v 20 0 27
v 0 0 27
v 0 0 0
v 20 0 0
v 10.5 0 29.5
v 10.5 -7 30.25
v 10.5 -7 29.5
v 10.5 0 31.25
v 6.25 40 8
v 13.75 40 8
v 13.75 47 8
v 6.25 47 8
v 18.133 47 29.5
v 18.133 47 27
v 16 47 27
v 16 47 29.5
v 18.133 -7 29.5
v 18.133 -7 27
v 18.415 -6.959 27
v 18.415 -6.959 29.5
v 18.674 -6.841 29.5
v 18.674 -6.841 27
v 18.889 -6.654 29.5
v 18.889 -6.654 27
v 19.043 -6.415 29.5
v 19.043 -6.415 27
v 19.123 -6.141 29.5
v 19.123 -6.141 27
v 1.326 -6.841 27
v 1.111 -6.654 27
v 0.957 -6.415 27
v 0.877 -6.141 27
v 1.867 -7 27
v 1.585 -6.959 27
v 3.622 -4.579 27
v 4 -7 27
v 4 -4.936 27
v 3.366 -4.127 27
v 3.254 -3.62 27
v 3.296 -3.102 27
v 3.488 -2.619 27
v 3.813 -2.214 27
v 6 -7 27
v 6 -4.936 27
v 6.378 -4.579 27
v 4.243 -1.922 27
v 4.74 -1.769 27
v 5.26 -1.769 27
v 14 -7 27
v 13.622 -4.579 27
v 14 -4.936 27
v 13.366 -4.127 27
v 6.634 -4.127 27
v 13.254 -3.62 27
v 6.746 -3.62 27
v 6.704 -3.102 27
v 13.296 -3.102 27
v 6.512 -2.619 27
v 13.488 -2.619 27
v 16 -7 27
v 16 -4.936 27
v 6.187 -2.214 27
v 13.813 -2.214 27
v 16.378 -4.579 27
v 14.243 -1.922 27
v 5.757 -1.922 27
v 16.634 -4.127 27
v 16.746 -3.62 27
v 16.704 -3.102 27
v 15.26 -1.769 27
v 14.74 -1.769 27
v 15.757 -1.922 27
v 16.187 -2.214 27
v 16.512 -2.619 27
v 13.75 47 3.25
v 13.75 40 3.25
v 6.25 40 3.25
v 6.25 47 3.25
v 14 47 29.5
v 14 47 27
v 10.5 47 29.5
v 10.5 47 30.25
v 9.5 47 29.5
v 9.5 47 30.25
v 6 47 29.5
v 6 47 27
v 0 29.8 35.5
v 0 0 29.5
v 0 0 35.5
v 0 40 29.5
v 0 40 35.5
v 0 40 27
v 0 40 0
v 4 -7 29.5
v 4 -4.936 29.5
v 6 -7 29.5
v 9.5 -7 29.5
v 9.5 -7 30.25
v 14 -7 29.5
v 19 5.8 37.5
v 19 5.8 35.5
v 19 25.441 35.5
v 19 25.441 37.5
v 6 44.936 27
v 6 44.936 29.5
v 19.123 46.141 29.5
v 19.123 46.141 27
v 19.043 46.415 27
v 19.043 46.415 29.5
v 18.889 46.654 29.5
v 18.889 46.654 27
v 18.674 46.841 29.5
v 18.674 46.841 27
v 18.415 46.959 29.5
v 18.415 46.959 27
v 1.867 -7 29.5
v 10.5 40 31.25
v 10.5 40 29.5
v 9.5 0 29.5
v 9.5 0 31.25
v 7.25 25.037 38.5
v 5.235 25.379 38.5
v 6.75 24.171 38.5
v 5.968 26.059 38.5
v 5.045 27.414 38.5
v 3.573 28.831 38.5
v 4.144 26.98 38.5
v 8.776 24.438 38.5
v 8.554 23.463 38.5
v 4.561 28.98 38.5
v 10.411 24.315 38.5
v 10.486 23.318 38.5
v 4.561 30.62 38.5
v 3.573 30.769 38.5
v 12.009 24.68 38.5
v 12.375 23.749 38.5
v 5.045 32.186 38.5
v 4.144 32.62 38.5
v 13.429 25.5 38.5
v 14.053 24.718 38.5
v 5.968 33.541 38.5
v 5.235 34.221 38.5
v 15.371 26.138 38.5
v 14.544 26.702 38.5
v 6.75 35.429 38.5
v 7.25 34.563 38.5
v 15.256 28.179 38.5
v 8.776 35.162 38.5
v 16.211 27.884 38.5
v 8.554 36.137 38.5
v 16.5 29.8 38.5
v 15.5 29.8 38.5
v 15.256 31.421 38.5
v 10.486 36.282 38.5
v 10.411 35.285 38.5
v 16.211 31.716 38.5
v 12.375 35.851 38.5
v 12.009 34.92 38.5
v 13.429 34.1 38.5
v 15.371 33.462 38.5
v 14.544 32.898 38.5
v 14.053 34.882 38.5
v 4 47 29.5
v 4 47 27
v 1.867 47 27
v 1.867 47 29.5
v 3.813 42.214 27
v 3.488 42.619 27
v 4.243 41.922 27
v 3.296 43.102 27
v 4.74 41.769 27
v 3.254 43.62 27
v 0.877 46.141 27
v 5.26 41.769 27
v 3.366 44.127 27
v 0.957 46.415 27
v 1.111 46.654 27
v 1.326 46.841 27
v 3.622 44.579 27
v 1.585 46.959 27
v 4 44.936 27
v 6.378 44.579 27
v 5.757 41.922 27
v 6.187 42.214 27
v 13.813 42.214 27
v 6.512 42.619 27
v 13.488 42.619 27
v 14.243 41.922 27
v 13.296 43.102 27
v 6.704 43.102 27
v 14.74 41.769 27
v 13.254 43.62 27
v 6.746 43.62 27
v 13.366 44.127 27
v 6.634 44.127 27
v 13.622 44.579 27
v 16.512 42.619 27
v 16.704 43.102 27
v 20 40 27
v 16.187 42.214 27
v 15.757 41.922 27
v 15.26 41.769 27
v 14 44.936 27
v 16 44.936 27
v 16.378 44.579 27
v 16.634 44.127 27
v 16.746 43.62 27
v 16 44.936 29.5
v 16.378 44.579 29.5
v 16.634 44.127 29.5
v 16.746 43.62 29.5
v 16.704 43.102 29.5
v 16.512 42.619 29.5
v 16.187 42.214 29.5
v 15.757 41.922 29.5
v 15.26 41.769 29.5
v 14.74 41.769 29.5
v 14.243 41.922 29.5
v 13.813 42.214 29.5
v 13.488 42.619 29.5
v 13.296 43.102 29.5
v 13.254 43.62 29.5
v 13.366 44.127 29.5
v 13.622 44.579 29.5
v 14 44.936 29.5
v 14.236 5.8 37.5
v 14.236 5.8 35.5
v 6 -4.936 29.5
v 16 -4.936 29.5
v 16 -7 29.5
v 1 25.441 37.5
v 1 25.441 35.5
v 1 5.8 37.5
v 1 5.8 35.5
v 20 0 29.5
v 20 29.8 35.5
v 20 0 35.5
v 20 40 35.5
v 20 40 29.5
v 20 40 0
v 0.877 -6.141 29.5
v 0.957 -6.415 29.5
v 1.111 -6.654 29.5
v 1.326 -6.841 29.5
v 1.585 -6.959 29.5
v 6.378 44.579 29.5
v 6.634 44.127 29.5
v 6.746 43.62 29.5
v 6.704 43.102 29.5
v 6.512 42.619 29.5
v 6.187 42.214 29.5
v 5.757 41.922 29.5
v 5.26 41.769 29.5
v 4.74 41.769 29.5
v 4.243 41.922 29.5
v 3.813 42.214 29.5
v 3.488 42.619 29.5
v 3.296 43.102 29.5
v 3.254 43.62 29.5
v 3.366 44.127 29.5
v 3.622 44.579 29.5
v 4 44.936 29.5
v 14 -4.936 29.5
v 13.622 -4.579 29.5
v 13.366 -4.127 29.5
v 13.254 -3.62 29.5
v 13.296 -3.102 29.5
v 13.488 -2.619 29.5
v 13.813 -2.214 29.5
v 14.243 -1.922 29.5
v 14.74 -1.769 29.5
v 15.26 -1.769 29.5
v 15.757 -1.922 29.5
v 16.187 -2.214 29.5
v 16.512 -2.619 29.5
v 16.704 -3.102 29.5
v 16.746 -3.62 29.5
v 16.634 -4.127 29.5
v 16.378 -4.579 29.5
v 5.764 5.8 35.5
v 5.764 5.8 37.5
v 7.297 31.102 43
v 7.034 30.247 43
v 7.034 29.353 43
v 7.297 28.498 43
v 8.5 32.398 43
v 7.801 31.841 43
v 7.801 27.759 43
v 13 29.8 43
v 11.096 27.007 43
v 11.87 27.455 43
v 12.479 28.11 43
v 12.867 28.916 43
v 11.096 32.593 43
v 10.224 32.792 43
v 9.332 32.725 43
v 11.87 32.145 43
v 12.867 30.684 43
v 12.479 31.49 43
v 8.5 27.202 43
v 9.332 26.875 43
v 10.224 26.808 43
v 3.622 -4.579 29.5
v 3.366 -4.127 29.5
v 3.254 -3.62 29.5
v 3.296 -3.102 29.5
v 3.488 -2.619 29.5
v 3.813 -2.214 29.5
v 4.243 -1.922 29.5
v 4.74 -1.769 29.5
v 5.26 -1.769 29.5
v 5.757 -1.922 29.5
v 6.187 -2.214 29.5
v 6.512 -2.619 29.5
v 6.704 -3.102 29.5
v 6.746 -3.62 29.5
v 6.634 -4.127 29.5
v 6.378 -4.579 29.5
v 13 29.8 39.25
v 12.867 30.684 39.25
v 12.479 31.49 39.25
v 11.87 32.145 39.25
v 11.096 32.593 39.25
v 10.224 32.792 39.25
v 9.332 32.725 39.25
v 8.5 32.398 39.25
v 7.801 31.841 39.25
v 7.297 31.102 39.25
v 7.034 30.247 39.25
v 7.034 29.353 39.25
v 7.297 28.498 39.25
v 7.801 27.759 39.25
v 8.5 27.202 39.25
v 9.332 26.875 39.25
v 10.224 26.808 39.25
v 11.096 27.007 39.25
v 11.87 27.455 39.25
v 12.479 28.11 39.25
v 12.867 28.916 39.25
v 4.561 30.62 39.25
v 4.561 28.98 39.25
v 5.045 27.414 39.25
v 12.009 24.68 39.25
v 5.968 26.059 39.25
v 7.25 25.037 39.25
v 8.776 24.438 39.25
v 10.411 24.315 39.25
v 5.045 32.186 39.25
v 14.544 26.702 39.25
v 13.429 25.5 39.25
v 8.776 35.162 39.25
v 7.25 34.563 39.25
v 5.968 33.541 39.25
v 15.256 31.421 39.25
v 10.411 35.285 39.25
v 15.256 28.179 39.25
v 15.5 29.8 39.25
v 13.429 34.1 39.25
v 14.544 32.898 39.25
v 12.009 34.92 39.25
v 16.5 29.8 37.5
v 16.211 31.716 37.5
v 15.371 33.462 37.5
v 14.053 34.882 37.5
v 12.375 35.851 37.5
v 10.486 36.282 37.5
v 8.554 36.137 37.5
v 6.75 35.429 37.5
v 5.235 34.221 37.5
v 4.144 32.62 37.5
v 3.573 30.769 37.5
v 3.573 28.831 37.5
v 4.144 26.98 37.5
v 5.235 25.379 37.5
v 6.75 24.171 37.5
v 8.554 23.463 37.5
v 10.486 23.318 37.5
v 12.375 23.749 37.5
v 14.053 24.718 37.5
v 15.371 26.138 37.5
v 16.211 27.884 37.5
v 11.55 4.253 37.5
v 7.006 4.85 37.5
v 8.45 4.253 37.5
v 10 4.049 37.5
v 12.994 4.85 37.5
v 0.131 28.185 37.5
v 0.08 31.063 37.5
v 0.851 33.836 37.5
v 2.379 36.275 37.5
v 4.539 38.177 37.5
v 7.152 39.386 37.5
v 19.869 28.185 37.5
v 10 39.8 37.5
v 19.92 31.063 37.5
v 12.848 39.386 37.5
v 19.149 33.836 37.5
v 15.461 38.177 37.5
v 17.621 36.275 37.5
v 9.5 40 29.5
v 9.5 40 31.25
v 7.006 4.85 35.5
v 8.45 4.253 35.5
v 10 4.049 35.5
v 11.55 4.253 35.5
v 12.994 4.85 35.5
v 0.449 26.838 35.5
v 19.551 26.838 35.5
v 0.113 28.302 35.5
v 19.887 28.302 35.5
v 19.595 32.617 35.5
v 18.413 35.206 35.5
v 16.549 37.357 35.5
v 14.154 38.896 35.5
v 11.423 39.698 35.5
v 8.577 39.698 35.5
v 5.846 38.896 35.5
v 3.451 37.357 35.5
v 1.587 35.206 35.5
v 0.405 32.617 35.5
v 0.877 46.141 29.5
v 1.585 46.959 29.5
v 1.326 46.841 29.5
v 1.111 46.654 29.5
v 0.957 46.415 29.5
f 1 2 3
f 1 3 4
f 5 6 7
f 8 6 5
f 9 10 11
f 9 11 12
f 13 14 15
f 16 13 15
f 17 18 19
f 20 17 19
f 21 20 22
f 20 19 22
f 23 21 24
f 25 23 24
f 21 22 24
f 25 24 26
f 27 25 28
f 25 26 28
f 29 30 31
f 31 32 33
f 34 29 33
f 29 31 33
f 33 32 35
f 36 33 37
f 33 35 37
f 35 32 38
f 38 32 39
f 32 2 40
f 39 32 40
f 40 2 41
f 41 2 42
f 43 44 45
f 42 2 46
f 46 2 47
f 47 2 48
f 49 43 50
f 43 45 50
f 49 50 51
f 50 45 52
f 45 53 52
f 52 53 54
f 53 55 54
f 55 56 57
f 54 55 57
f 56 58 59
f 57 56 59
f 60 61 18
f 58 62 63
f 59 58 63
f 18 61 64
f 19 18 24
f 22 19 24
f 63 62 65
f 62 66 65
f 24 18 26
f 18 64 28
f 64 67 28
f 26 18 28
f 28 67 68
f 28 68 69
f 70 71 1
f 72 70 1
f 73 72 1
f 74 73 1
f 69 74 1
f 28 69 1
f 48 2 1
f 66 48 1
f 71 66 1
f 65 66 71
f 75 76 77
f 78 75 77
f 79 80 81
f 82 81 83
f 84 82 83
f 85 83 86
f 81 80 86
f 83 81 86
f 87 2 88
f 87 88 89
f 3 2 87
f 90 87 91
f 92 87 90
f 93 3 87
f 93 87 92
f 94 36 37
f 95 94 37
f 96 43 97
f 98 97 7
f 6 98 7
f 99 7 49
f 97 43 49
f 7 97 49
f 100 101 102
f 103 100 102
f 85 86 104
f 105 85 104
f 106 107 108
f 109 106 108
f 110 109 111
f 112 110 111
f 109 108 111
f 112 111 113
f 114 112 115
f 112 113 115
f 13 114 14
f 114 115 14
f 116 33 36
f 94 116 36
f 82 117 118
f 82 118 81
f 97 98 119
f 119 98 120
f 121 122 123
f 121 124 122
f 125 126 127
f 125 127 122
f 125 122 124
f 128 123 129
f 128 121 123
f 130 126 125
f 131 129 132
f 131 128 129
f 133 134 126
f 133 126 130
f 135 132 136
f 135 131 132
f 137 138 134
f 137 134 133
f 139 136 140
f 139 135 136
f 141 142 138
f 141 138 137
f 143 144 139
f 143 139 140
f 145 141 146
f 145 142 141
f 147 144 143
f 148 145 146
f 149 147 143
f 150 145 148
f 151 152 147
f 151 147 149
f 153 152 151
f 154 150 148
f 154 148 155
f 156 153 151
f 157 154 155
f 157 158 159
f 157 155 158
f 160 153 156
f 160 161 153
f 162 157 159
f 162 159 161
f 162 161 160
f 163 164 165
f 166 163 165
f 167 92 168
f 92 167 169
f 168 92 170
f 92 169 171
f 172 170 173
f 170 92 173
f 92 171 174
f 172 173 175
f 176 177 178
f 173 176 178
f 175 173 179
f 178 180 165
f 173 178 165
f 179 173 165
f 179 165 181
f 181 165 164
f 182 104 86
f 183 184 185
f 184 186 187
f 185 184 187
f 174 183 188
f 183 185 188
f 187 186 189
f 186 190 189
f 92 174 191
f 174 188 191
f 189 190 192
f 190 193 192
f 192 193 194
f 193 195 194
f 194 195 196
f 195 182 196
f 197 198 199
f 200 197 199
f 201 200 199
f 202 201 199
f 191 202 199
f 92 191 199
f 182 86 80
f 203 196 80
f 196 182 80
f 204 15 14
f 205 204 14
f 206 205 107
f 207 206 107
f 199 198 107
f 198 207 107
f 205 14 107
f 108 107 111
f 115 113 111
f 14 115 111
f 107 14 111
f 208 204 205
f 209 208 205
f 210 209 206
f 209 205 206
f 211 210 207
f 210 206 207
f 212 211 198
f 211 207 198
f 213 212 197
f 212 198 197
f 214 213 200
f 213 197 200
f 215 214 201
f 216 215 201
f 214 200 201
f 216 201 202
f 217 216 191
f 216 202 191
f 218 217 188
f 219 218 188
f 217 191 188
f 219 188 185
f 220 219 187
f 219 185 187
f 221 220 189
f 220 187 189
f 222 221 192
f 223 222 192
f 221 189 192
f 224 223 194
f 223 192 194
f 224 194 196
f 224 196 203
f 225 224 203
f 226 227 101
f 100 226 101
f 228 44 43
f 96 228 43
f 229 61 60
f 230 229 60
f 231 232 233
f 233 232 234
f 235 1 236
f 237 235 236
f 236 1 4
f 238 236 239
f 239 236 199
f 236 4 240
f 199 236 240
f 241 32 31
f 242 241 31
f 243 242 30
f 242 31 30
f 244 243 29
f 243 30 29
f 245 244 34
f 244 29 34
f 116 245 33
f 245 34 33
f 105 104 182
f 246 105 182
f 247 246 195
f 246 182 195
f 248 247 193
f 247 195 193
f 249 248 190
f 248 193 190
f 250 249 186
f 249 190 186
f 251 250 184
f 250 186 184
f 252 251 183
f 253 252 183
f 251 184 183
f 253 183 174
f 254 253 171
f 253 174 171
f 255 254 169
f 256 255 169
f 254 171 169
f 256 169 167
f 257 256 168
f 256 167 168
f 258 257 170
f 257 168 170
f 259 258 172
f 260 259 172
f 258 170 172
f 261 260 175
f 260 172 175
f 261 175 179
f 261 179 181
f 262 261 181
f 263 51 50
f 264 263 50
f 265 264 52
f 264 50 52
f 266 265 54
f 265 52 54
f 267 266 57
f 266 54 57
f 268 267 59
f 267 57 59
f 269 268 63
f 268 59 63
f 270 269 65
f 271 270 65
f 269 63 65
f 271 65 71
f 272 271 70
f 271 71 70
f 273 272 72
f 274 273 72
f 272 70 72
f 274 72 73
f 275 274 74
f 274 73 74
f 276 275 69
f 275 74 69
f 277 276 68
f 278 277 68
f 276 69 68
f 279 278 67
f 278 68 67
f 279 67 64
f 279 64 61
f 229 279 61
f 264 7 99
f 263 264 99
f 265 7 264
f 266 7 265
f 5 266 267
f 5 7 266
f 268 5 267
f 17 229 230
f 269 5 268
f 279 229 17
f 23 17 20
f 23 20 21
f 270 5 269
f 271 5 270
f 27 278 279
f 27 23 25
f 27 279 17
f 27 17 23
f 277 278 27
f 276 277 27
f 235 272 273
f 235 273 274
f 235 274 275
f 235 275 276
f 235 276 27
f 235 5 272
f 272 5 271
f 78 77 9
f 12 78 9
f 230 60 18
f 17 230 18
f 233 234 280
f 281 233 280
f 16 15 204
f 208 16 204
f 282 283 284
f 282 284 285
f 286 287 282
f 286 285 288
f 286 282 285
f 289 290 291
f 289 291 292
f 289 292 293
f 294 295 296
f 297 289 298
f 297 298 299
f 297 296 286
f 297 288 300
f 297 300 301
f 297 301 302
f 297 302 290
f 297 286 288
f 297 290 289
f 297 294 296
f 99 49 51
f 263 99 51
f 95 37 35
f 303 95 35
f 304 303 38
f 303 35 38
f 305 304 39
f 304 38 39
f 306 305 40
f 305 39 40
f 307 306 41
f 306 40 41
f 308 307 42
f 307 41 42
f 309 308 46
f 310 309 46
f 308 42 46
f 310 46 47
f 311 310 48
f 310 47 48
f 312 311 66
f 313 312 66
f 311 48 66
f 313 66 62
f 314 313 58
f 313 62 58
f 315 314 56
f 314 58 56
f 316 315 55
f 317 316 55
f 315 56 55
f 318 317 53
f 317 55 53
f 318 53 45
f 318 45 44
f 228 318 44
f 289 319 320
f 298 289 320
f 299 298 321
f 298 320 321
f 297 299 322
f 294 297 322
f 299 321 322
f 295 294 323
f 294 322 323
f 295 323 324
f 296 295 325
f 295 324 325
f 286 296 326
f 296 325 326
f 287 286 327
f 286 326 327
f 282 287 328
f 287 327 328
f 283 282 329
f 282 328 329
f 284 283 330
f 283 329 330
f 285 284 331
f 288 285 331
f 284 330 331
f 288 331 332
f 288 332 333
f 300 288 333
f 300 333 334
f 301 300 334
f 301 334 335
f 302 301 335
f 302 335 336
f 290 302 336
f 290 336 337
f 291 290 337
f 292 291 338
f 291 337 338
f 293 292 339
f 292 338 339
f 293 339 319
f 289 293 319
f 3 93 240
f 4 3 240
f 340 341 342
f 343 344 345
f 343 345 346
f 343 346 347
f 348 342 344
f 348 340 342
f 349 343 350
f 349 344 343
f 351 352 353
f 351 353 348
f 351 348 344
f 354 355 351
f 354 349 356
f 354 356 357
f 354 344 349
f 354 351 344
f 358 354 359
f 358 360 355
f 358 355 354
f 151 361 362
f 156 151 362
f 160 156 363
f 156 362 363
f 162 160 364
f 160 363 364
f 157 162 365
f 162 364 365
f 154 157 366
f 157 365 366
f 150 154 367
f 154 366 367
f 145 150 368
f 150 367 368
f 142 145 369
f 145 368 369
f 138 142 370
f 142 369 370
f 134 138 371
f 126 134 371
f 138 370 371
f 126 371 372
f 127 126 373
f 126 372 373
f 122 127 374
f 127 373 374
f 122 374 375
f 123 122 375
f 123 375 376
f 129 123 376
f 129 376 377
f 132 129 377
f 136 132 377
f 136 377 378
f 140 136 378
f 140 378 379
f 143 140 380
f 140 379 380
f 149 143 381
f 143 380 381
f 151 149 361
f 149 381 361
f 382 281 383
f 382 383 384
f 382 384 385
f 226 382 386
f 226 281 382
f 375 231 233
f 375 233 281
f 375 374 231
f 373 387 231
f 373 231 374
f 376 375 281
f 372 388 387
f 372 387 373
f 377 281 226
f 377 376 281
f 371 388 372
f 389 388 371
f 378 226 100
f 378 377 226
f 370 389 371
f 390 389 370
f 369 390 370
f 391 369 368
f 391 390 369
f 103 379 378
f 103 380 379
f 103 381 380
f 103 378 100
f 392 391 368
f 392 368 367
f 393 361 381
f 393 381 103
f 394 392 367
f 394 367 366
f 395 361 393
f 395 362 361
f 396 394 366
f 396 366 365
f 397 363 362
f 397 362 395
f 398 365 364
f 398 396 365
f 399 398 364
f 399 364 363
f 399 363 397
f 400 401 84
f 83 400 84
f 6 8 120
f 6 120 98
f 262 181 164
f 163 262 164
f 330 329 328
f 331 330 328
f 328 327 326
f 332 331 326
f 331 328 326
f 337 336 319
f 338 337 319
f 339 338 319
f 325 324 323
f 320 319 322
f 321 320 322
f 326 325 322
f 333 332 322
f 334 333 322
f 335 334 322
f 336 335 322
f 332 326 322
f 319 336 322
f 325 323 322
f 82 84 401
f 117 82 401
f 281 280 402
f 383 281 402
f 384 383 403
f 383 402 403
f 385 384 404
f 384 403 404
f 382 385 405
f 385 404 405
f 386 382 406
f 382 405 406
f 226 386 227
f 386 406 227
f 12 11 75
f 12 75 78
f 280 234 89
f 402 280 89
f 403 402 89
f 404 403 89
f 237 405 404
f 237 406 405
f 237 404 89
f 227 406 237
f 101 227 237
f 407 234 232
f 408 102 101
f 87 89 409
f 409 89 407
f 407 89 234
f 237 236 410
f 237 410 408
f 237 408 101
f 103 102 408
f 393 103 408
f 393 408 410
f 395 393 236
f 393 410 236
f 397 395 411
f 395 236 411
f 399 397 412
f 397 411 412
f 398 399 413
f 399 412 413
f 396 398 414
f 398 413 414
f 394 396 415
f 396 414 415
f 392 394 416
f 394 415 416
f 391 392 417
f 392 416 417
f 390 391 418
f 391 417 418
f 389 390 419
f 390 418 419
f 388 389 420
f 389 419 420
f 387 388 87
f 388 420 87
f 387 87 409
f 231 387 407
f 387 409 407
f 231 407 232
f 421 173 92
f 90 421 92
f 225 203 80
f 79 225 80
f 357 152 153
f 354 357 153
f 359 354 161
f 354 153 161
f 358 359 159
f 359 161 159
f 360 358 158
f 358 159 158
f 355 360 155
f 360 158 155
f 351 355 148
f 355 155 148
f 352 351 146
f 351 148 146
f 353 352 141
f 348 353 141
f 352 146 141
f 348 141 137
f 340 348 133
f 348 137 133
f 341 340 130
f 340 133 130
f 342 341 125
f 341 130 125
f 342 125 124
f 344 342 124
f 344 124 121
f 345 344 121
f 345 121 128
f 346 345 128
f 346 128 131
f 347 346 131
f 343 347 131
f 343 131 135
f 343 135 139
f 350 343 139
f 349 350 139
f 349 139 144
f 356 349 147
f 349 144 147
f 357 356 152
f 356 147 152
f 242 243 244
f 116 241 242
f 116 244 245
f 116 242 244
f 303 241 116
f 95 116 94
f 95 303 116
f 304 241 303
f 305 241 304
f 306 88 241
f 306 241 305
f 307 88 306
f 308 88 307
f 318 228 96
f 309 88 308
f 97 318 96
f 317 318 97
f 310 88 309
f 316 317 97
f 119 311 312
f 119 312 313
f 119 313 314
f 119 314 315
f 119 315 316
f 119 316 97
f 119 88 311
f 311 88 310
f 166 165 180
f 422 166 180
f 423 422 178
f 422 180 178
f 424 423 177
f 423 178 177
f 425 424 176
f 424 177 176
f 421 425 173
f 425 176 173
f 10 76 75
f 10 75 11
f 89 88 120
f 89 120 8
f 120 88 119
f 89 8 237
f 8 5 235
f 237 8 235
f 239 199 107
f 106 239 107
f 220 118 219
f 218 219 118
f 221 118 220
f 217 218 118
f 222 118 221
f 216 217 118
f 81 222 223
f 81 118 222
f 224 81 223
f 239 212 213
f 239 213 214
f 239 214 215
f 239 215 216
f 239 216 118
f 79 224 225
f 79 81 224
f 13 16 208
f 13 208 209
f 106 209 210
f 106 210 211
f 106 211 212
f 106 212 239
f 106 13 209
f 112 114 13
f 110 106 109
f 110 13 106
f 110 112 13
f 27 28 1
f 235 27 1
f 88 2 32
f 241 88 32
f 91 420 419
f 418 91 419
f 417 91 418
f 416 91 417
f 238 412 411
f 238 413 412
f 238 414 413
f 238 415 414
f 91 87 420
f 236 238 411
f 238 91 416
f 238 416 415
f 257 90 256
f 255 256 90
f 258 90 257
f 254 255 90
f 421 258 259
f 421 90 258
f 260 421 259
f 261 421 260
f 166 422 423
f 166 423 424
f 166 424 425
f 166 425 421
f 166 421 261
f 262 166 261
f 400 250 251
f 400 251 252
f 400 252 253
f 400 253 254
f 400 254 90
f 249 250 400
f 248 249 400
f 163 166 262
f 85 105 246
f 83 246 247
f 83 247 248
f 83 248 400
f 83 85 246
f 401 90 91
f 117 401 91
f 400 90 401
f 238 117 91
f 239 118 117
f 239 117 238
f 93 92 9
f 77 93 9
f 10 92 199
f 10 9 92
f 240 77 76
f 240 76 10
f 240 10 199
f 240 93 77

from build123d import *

# Parameters (mm, degrees)
F0_W      = 20
F0_H      = 40
F1_DEPTH  = 35.5
F3_W      = 20
F3_H      = 40
F4_DEPTH  = 2.5
F7_DEPTH  = 0.5
F9_DEPTH  = 2
F10_R     = 6.5
F11_DEPTH = 1
F12_R     = 5.5
F13_DEPTH = 0.75
F14_R     = 3
F15_DEPTH = 3.75
F16_W     = 7.5
F16_H     = 4.75
F17_DEPTH = 7


with BuildPart() as f1:
    # F0 (on Top) → F1 (new body)
    with BuildSketch(Plane.XY):
        with Locations((10, 20)):
            Rectangle(F0_W, F0_H)
    extrude(amount=F1_DEPTH)

    # F3 (on offset) → F4 (join)
    with BuildSketch(Plane.XY.offset(27)):
        with Locations((10, 20)):
            Rectangle(F3_W, F3_H)
        with BuildLine():
            Line((0, 40), (20, 40))
            Line((20, 40), (19.122654, 46.141421))
            ThreePointArc((19.122654, 46.141421), (18.787906, 46.755454), (18.132705, 47))
            Line((18.132705, 47), (16, 47))
            Line((16, 47), (16, 44.936141))
            ThreePointArc((16, 44.936141), (15, 41.75), (14, 44.936141))
            Line((14, 44.936141), (14, 47))
            Line((14, 47), (6, 47))
            Line((6, 47), (6, 44.936141))
            ThreePointArc((6, 44.936141), (5, 41.75), (4, 44.936141))
            Line((4, 44.936141), (4, 47))
            Line((4, 47), (1.867295, 47))
            ThreePointArc((1.867295, 47), (1.212094, 46.755454), (0.877346, 46.141421))
            Line((0.877346, 46.141421), (0, 40))
        make_face()
        with BuildLine():
            Line((19.122654, -6.141421), (20, 0))
            Line((20, 0), (0, 0))
            Line((0, 0), (0.877346, -6.141421))
            ThreePointArc((0.877346, -6.141421), (1.212094, -6.755454), (1.867295, -7))
            Line((1.867295, -7), (4, -7))
            Line((4, -7), (4, -4.936141))
            ThreePointArc((4, -4.936141), (5, -1.75), (6, -4.936141))
            Line((6, -4.936141), (6, -7))
            Line((6, -7), (14, -7))
            Line((14, -7), (14, -4.936141))
            ThreePointArc((14, -4.936141), (15, -1.75), (16, -4.936141))
            Line((16, -4.936141), (16, -7))
            Line((16, -7), (18.132705, -7))
            ThreePointArc((18.132705, -7), (18.787906, -6.755454), (19.122654, -6.141421))
        make_face()
    extrude(amount=F4_DEPTH)

    # F6 (on offset) → F7 (join, symmetric)
    with BuildSketch(Plane.YZ.offset(10)):
        Polygon((40, 31.25), (40, 29.5), (47, 29.5), (47, 30.25), align=None)
        Polygon((-7, 29.5), (0, 29.5), (0, 31.25), (-7, 30.25), align=None)
    extrude(amount=F7_DEPTH, both=True)

    # F8 (on face) → F9 (join)
    with BuildSketch(Plane.XY.offset(35.5)):
        with BuildLine():
            Line((19, 5.8), (19, 25.441101))
            ThreePointArc((19, 25.441101), (10, 39.8), (1, 25.441101))
            Line((1, 25.441101), (1, 5.8))
            Line((1, 5.8), (5.764225, 5.8))
            ThreePointArc((5.764225, 5.8), (10, 4.049495), (14.235775, 5.8))
            Line((14.235775, 5.8), (19, 5.8))
        make_face()
    extrude(amount=F9_DEPTH)

    # F10 (on face) → F11 (join)
    with BuildSketch(Plane.XY.offset(37.5)):
        with Locations((10, 29.8)):
            Circle(F10_R)
    extrude(amount=F11_DEPTH)

    # F12 (on face) → F13 (join)
    with BuildSketch(Plane.XY.offset(38.5)):
        with Locations((10, 29.8)):
            Circle(F12_R)
    extrude(amount=F13_DEPTH)

    # F16 (on face) → F17 (join)
    with BuildSketch(Plane(origin=(0, 40, 0), x_dir=(-1, 0, 0), z_dir=(0, 1, 0))):
        with Locations((-10, 5.625)):
            Rectangle(F16_W, F16_H)
    extrude(amount=F17_DEPTH)


with BuildPart() as f15:
    # F14 (on face) → F15 (new body)
    with BuildSketch(Plane.XY.offset(39.25)):
        with Locations((10, 29.8)):
            Circle(F14_R)
    extrude(amount=F15_DEPTH)


solid = Compound([f1.part, f15.part])
